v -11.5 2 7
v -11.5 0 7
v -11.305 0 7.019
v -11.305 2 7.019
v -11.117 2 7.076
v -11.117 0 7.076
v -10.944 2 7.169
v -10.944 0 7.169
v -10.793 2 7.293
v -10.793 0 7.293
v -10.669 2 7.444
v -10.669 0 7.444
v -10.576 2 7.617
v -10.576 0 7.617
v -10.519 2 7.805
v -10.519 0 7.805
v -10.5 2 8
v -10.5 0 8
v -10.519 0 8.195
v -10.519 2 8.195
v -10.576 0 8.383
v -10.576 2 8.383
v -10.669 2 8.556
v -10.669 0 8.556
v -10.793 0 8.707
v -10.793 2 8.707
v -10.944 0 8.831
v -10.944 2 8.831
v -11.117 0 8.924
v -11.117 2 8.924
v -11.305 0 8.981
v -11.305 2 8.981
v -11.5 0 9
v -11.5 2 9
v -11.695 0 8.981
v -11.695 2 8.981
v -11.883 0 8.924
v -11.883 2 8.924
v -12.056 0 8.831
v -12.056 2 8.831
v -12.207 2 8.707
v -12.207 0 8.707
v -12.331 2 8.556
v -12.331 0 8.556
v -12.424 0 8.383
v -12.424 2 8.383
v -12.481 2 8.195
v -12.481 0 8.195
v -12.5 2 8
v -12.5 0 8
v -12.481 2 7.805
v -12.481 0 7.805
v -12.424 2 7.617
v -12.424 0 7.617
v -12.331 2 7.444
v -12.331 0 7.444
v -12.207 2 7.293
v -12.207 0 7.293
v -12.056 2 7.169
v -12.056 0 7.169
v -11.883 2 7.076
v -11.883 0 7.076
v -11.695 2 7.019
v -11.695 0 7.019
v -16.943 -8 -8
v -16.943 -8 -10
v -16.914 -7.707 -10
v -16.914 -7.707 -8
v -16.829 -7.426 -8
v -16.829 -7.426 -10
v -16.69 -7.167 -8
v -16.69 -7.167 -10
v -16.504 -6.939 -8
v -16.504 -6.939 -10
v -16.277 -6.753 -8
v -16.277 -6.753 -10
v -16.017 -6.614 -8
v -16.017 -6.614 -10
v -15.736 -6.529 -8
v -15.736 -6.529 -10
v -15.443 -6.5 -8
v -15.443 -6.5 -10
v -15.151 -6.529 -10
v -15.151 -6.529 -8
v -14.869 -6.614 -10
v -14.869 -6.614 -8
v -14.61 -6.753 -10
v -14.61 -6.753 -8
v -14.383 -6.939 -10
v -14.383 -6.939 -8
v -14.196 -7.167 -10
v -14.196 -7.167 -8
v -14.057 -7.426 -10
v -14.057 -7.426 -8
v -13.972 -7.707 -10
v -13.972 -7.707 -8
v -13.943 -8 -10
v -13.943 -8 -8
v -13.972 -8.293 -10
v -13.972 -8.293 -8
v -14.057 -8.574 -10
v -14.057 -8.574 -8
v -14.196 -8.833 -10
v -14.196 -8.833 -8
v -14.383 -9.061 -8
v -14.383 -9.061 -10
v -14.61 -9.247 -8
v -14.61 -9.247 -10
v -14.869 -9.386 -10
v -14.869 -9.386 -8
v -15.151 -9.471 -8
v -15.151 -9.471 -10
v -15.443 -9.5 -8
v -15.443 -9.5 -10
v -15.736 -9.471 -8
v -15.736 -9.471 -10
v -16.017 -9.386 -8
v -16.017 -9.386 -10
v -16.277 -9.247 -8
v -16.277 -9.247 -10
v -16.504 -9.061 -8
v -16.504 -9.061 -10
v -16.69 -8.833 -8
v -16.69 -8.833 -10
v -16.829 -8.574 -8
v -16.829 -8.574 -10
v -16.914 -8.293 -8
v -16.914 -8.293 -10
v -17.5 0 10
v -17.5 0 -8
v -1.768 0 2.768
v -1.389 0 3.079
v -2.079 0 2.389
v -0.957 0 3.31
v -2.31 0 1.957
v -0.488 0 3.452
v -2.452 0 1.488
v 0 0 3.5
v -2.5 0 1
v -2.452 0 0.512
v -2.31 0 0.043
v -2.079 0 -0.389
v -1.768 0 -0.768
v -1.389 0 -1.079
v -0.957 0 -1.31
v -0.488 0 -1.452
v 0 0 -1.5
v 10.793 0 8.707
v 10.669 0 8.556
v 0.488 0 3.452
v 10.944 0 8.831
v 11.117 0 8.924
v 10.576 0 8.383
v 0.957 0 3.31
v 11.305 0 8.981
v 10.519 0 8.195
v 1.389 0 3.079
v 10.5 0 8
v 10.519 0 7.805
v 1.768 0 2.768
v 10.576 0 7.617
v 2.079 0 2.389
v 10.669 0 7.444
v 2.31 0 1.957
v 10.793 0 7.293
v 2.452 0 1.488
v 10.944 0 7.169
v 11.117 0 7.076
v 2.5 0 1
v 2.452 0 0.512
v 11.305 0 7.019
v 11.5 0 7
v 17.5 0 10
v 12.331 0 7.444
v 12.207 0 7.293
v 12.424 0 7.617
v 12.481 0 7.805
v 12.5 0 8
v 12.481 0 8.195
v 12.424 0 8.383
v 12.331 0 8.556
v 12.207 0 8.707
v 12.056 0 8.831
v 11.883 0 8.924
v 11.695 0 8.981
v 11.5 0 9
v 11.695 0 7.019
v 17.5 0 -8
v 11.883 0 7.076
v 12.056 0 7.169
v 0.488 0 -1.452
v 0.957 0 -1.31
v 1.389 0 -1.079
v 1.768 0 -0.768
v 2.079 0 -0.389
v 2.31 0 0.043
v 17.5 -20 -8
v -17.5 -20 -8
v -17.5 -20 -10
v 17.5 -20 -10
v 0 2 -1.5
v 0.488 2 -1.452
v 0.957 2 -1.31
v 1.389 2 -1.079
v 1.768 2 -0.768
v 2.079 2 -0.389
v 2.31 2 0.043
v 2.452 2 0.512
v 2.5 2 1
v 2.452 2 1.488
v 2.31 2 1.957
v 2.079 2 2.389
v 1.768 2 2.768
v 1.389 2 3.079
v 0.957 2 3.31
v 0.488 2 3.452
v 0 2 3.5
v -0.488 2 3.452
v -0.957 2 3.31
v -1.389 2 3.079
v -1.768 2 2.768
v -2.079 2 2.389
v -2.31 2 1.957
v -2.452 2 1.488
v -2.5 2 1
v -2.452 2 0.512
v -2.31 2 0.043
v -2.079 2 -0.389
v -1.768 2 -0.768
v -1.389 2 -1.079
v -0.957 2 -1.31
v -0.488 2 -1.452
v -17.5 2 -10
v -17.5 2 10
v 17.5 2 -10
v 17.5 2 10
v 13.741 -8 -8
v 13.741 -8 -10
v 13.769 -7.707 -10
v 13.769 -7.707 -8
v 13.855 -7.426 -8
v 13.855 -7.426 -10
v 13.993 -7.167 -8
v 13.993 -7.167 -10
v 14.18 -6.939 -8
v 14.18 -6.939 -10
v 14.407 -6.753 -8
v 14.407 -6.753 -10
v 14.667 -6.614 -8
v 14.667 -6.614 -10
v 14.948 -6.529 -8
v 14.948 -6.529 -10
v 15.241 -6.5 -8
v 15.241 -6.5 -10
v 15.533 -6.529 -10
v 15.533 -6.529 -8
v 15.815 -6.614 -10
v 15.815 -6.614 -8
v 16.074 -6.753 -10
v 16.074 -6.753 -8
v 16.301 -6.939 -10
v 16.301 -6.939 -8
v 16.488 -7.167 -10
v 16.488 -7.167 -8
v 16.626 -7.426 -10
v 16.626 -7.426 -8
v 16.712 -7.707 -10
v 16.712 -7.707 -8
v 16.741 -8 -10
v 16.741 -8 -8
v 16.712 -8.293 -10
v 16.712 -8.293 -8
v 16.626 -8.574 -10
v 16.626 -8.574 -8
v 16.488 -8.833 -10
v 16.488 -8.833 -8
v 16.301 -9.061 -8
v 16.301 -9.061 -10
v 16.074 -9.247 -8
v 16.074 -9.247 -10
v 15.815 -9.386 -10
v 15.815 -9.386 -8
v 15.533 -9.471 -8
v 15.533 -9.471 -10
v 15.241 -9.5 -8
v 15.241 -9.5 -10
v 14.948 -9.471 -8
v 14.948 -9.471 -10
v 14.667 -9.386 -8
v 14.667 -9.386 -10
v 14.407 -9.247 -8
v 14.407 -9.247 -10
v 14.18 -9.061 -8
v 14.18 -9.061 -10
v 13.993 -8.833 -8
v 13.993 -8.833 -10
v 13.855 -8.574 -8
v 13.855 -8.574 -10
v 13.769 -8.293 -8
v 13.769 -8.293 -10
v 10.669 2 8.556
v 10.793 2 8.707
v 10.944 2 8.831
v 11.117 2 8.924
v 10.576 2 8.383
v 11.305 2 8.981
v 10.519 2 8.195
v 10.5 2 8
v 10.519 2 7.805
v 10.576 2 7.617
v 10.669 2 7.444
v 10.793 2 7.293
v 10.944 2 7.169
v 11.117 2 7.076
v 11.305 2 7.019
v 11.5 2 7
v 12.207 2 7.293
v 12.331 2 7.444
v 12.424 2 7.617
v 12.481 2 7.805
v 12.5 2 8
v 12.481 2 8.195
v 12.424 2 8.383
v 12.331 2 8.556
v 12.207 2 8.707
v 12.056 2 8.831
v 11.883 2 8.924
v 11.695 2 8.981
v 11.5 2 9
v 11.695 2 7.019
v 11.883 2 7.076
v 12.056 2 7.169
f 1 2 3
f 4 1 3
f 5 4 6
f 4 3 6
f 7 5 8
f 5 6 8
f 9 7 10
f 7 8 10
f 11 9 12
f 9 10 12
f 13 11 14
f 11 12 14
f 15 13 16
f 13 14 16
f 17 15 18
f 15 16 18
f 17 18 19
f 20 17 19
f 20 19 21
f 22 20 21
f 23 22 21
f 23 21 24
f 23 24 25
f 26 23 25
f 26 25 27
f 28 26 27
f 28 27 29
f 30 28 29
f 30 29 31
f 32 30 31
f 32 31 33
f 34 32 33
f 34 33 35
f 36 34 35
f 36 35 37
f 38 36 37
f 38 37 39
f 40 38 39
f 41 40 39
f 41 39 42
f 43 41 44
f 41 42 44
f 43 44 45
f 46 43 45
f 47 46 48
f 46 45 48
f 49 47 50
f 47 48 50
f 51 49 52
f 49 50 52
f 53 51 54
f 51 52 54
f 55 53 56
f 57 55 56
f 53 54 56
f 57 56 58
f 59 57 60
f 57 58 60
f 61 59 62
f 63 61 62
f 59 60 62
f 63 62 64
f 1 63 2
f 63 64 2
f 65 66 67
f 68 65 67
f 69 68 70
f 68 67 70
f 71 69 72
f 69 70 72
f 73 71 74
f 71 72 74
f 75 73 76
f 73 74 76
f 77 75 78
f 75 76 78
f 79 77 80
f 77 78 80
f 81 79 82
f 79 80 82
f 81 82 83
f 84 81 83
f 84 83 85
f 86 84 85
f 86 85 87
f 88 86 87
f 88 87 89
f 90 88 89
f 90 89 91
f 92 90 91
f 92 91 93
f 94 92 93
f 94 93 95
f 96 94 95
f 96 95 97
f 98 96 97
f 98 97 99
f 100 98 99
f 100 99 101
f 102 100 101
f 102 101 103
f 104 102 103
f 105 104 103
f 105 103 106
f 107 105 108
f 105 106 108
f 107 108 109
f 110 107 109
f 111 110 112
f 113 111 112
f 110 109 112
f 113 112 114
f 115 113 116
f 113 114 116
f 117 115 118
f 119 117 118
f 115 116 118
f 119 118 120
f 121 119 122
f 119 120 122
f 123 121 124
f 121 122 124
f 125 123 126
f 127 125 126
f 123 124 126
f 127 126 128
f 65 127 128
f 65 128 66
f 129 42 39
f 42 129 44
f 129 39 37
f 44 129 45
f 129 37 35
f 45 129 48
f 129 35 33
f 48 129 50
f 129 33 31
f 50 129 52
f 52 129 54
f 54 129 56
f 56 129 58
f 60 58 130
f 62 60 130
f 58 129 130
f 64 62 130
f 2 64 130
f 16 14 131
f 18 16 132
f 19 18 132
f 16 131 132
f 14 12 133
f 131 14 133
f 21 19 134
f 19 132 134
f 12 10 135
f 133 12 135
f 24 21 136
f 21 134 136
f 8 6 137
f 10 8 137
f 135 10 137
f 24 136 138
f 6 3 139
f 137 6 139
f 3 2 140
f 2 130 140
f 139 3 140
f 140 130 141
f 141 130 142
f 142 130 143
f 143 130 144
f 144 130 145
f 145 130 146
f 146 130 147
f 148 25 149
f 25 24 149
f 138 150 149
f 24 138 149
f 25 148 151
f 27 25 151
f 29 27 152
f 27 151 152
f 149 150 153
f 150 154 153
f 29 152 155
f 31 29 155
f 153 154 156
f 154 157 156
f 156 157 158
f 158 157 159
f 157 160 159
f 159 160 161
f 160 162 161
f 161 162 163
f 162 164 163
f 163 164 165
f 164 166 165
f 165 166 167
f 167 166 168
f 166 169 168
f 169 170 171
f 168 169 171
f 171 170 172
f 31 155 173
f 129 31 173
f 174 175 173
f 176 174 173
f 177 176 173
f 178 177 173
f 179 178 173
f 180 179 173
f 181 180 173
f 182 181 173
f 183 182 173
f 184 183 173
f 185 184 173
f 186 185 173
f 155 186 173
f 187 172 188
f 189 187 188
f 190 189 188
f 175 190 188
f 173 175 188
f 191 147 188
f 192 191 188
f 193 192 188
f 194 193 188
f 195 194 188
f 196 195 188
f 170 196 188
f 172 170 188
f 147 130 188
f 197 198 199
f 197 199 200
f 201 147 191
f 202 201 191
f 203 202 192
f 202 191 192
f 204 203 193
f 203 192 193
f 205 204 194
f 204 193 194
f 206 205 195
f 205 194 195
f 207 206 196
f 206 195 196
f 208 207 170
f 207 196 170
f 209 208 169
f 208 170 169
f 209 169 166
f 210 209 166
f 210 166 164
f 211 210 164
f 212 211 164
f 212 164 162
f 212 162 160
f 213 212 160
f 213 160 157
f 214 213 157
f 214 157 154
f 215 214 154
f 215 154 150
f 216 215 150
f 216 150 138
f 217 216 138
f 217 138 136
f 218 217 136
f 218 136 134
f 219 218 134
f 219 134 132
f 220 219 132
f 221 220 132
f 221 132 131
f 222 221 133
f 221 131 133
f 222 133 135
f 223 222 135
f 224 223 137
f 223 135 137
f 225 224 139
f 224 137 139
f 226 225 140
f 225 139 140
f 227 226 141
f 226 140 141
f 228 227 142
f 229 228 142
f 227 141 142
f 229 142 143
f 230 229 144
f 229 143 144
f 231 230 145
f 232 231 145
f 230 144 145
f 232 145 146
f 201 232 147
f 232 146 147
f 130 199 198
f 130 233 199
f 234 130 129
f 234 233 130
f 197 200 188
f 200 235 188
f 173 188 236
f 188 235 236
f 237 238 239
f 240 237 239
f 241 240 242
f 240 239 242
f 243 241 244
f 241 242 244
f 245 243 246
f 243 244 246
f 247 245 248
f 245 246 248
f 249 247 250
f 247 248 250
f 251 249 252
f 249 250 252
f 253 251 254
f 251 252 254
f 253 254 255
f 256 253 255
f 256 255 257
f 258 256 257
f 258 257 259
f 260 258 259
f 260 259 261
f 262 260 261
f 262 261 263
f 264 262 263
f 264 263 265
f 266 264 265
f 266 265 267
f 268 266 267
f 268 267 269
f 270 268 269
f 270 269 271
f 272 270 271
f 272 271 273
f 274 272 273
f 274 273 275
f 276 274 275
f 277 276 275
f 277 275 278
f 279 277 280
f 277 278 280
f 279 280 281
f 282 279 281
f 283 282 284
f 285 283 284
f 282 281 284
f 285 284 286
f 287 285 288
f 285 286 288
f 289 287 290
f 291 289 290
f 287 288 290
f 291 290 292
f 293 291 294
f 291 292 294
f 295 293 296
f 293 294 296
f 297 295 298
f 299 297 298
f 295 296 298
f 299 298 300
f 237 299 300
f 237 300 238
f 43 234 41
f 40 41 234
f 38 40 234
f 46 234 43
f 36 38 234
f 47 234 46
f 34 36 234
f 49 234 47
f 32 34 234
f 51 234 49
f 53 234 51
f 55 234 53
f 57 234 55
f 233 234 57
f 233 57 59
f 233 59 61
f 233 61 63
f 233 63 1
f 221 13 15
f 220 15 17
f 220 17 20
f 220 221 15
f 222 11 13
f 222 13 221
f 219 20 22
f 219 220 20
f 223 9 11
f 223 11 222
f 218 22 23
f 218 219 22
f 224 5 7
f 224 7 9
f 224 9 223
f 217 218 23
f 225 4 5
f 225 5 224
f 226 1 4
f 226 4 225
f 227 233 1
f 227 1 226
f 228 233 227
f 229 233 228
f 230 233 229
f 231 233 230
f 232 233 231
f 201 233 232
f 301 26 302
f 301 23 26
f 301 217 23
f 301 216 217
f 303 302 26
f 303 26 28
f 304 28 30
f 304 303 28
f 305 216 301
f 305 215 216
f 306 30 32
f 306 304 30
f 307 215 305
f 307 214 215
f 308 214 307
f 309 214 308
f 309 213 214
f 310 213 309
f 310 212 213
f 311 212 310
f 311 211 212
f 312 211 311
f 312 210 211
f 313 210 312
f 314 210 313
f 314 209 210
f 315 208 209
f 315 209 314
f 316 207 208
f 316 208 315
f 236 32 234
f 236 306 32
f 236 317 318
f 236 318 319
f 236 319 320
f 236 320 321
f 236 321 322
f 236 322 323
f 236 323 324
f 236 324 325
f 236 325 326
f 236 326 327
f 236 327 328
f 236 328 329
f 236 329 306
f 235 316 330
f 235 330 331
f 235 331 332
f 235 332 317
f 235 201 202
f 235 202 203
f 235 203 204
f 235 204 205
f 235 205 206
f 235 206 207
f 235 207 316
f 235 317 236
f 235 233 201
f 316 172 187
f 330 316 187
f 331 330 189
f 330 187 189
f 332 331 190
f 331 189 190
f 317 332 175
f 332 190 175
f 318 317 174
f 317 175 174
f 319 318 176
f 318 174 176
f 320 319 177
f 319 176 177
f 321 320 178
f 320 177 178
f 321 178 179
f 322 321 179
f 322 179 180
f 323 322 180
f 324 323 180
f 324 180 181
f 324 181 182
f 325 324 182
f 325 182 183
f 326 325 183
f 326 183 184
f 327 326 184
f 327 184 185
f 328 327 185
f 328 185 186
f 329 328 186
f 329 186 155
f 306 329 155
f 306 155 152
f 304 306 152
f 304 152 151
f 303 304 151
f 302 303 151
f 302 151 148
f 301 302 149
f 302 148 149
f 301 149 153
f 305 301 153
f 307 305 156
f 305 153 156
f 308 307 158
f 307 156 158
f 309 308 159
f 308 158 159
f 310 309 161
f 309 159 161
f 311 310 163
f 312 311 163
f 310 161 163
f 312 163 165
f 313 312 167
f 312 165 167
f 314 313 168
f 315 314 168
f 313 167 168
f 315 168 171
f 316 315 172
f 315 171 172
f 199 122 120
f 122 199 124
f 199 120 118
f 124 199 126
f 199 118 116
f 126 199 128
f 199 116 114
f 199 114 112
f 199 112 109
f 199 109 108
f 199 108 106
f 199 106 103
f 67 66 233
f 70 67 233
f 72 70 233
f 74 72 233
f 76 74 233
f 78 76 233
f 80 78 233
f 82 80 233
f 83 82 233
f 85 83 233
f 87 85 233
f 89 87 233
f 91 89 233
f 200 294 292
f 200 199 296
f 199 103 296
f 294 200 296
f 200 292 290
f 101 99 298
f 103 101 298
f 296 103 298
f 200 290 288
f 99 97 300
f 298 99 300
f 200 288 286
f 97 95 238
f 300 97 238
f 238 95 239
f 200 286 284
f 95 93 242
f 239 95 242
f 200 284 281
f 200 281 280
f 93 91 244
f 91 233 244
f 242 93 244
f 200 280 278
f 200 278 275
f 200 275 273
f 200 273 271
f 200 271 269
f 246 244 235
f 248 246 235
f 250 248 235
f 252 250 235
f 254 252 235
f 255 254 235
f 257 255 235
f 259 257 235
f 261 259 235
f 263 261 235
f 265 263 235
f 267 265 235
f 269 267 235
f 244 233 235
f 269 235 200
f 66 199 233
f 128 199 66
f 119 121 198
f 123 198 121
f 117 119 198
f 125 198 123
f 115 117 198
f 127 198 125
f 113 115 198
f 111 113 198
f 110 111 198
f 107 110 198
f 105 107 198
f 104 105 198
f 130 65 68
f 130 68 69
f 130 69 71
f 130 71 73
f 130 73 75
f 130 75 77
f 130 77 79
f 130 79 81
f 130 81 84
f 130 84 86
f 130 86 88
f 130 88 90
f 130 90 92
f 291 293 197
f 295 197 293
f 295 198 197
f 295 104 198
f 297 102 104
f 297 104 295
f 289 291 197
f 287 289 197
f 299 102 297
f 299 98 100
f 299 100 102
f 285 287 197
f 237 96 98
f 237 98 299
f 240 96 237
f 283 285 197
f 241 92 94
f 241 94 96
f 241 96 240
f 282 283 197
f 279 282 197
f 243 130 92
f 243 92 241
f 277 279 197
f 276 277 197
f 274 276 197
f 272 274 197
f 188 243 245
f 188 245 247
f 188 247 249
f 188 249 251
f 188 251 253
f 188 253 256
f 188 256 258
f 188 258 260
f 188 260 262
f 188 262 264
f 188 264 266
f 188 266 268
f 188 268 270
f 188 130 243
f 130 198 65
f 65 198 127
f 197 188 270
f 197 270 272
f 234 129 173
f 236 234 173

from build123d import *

# Parameters (mm, degrees)
SKETCH1_W           = 35
SKETCH1_H           = 20
BOSS_EXTRUDE1_DEPTH = 2
SKETCH2_W           = 35
SKETCH2_H           = 2
BOSS_EXTRUDE2_DEPTH = 20
SKETCH3_R           = 1.5
CUT_EXTRUDE1_DEPTH  = 20
SKETCH4_R           = 1
CUT_EXTRUDE2_DEPTH  = 20
SKETCH6_R           = 2.5
CUT_EXTRUDE3_DEPTH  = 20


with BuildPart() as part:
    # Sketch1 → Boss-Extrude1 (new body)
    with BuildSketch(Plane(origin=(0, 0, 0), x_dir=(1, 0, 0), z_dir=(0, 1, 0))):
        Rectangle(SKETCH1_W, SKETCH1_H)
    extrude(amount=BOSS_EXTRUDE1_DEPTH)

    # Sketch2 → Boss-Extrude2 (add)
    with BuildSketch(Plane.XZ):
        with Locations((0, -9)):
            Rectangle(SKETCH2_W, SKETCH2_H)
    extrude(amount=BOSS_EXTRUDE2_DEPTH)

    # Sketch3 → Cut-Extrude1 (cut)
    with BuildSketch(Plane(origin=(0, 0, -10), x_dir=(-1, 0, 0), z_dir=(0, 0, -1))):
        with Locations((-15.240565198, -8)):
            Circle(SKETCH3_R)
        with Locations((15.443232288, -8)):
            Circle(SKETCH3_R)
    extrude(amount=-CUT_EXTRUDE1_DEPTH, mode=Mode.SUBTRACT)

    # Sketch4 → Cut-Extrude2 (cut)
    with BuildSketch(Plane.XZ):
        with Locations(Location((-11.5, 8, 0), (0, 0, 270))):
            Circle(SKETCH4_R)
        with Locations(Location((11.5, 8, 0), (0, 0, 270))):
            Circle(SKETCH4_R)
    extrude(amount=-CUT_EXTRUDE2_DEPTH, mode=Mode.SUBTRACT)

    # Sketch6 → Cut-Extrude3 (cut)
    with BuildSketch(Plane.XZ):
        with Locations(Location((0, 1, 0), (0, 0, 270))):
            Circle(SKETCH6_R)
    extrude(amount=-CUT_EXTRUDE3_DEPTH, mode=Mode.SUBTRACT)


solid = part.part
